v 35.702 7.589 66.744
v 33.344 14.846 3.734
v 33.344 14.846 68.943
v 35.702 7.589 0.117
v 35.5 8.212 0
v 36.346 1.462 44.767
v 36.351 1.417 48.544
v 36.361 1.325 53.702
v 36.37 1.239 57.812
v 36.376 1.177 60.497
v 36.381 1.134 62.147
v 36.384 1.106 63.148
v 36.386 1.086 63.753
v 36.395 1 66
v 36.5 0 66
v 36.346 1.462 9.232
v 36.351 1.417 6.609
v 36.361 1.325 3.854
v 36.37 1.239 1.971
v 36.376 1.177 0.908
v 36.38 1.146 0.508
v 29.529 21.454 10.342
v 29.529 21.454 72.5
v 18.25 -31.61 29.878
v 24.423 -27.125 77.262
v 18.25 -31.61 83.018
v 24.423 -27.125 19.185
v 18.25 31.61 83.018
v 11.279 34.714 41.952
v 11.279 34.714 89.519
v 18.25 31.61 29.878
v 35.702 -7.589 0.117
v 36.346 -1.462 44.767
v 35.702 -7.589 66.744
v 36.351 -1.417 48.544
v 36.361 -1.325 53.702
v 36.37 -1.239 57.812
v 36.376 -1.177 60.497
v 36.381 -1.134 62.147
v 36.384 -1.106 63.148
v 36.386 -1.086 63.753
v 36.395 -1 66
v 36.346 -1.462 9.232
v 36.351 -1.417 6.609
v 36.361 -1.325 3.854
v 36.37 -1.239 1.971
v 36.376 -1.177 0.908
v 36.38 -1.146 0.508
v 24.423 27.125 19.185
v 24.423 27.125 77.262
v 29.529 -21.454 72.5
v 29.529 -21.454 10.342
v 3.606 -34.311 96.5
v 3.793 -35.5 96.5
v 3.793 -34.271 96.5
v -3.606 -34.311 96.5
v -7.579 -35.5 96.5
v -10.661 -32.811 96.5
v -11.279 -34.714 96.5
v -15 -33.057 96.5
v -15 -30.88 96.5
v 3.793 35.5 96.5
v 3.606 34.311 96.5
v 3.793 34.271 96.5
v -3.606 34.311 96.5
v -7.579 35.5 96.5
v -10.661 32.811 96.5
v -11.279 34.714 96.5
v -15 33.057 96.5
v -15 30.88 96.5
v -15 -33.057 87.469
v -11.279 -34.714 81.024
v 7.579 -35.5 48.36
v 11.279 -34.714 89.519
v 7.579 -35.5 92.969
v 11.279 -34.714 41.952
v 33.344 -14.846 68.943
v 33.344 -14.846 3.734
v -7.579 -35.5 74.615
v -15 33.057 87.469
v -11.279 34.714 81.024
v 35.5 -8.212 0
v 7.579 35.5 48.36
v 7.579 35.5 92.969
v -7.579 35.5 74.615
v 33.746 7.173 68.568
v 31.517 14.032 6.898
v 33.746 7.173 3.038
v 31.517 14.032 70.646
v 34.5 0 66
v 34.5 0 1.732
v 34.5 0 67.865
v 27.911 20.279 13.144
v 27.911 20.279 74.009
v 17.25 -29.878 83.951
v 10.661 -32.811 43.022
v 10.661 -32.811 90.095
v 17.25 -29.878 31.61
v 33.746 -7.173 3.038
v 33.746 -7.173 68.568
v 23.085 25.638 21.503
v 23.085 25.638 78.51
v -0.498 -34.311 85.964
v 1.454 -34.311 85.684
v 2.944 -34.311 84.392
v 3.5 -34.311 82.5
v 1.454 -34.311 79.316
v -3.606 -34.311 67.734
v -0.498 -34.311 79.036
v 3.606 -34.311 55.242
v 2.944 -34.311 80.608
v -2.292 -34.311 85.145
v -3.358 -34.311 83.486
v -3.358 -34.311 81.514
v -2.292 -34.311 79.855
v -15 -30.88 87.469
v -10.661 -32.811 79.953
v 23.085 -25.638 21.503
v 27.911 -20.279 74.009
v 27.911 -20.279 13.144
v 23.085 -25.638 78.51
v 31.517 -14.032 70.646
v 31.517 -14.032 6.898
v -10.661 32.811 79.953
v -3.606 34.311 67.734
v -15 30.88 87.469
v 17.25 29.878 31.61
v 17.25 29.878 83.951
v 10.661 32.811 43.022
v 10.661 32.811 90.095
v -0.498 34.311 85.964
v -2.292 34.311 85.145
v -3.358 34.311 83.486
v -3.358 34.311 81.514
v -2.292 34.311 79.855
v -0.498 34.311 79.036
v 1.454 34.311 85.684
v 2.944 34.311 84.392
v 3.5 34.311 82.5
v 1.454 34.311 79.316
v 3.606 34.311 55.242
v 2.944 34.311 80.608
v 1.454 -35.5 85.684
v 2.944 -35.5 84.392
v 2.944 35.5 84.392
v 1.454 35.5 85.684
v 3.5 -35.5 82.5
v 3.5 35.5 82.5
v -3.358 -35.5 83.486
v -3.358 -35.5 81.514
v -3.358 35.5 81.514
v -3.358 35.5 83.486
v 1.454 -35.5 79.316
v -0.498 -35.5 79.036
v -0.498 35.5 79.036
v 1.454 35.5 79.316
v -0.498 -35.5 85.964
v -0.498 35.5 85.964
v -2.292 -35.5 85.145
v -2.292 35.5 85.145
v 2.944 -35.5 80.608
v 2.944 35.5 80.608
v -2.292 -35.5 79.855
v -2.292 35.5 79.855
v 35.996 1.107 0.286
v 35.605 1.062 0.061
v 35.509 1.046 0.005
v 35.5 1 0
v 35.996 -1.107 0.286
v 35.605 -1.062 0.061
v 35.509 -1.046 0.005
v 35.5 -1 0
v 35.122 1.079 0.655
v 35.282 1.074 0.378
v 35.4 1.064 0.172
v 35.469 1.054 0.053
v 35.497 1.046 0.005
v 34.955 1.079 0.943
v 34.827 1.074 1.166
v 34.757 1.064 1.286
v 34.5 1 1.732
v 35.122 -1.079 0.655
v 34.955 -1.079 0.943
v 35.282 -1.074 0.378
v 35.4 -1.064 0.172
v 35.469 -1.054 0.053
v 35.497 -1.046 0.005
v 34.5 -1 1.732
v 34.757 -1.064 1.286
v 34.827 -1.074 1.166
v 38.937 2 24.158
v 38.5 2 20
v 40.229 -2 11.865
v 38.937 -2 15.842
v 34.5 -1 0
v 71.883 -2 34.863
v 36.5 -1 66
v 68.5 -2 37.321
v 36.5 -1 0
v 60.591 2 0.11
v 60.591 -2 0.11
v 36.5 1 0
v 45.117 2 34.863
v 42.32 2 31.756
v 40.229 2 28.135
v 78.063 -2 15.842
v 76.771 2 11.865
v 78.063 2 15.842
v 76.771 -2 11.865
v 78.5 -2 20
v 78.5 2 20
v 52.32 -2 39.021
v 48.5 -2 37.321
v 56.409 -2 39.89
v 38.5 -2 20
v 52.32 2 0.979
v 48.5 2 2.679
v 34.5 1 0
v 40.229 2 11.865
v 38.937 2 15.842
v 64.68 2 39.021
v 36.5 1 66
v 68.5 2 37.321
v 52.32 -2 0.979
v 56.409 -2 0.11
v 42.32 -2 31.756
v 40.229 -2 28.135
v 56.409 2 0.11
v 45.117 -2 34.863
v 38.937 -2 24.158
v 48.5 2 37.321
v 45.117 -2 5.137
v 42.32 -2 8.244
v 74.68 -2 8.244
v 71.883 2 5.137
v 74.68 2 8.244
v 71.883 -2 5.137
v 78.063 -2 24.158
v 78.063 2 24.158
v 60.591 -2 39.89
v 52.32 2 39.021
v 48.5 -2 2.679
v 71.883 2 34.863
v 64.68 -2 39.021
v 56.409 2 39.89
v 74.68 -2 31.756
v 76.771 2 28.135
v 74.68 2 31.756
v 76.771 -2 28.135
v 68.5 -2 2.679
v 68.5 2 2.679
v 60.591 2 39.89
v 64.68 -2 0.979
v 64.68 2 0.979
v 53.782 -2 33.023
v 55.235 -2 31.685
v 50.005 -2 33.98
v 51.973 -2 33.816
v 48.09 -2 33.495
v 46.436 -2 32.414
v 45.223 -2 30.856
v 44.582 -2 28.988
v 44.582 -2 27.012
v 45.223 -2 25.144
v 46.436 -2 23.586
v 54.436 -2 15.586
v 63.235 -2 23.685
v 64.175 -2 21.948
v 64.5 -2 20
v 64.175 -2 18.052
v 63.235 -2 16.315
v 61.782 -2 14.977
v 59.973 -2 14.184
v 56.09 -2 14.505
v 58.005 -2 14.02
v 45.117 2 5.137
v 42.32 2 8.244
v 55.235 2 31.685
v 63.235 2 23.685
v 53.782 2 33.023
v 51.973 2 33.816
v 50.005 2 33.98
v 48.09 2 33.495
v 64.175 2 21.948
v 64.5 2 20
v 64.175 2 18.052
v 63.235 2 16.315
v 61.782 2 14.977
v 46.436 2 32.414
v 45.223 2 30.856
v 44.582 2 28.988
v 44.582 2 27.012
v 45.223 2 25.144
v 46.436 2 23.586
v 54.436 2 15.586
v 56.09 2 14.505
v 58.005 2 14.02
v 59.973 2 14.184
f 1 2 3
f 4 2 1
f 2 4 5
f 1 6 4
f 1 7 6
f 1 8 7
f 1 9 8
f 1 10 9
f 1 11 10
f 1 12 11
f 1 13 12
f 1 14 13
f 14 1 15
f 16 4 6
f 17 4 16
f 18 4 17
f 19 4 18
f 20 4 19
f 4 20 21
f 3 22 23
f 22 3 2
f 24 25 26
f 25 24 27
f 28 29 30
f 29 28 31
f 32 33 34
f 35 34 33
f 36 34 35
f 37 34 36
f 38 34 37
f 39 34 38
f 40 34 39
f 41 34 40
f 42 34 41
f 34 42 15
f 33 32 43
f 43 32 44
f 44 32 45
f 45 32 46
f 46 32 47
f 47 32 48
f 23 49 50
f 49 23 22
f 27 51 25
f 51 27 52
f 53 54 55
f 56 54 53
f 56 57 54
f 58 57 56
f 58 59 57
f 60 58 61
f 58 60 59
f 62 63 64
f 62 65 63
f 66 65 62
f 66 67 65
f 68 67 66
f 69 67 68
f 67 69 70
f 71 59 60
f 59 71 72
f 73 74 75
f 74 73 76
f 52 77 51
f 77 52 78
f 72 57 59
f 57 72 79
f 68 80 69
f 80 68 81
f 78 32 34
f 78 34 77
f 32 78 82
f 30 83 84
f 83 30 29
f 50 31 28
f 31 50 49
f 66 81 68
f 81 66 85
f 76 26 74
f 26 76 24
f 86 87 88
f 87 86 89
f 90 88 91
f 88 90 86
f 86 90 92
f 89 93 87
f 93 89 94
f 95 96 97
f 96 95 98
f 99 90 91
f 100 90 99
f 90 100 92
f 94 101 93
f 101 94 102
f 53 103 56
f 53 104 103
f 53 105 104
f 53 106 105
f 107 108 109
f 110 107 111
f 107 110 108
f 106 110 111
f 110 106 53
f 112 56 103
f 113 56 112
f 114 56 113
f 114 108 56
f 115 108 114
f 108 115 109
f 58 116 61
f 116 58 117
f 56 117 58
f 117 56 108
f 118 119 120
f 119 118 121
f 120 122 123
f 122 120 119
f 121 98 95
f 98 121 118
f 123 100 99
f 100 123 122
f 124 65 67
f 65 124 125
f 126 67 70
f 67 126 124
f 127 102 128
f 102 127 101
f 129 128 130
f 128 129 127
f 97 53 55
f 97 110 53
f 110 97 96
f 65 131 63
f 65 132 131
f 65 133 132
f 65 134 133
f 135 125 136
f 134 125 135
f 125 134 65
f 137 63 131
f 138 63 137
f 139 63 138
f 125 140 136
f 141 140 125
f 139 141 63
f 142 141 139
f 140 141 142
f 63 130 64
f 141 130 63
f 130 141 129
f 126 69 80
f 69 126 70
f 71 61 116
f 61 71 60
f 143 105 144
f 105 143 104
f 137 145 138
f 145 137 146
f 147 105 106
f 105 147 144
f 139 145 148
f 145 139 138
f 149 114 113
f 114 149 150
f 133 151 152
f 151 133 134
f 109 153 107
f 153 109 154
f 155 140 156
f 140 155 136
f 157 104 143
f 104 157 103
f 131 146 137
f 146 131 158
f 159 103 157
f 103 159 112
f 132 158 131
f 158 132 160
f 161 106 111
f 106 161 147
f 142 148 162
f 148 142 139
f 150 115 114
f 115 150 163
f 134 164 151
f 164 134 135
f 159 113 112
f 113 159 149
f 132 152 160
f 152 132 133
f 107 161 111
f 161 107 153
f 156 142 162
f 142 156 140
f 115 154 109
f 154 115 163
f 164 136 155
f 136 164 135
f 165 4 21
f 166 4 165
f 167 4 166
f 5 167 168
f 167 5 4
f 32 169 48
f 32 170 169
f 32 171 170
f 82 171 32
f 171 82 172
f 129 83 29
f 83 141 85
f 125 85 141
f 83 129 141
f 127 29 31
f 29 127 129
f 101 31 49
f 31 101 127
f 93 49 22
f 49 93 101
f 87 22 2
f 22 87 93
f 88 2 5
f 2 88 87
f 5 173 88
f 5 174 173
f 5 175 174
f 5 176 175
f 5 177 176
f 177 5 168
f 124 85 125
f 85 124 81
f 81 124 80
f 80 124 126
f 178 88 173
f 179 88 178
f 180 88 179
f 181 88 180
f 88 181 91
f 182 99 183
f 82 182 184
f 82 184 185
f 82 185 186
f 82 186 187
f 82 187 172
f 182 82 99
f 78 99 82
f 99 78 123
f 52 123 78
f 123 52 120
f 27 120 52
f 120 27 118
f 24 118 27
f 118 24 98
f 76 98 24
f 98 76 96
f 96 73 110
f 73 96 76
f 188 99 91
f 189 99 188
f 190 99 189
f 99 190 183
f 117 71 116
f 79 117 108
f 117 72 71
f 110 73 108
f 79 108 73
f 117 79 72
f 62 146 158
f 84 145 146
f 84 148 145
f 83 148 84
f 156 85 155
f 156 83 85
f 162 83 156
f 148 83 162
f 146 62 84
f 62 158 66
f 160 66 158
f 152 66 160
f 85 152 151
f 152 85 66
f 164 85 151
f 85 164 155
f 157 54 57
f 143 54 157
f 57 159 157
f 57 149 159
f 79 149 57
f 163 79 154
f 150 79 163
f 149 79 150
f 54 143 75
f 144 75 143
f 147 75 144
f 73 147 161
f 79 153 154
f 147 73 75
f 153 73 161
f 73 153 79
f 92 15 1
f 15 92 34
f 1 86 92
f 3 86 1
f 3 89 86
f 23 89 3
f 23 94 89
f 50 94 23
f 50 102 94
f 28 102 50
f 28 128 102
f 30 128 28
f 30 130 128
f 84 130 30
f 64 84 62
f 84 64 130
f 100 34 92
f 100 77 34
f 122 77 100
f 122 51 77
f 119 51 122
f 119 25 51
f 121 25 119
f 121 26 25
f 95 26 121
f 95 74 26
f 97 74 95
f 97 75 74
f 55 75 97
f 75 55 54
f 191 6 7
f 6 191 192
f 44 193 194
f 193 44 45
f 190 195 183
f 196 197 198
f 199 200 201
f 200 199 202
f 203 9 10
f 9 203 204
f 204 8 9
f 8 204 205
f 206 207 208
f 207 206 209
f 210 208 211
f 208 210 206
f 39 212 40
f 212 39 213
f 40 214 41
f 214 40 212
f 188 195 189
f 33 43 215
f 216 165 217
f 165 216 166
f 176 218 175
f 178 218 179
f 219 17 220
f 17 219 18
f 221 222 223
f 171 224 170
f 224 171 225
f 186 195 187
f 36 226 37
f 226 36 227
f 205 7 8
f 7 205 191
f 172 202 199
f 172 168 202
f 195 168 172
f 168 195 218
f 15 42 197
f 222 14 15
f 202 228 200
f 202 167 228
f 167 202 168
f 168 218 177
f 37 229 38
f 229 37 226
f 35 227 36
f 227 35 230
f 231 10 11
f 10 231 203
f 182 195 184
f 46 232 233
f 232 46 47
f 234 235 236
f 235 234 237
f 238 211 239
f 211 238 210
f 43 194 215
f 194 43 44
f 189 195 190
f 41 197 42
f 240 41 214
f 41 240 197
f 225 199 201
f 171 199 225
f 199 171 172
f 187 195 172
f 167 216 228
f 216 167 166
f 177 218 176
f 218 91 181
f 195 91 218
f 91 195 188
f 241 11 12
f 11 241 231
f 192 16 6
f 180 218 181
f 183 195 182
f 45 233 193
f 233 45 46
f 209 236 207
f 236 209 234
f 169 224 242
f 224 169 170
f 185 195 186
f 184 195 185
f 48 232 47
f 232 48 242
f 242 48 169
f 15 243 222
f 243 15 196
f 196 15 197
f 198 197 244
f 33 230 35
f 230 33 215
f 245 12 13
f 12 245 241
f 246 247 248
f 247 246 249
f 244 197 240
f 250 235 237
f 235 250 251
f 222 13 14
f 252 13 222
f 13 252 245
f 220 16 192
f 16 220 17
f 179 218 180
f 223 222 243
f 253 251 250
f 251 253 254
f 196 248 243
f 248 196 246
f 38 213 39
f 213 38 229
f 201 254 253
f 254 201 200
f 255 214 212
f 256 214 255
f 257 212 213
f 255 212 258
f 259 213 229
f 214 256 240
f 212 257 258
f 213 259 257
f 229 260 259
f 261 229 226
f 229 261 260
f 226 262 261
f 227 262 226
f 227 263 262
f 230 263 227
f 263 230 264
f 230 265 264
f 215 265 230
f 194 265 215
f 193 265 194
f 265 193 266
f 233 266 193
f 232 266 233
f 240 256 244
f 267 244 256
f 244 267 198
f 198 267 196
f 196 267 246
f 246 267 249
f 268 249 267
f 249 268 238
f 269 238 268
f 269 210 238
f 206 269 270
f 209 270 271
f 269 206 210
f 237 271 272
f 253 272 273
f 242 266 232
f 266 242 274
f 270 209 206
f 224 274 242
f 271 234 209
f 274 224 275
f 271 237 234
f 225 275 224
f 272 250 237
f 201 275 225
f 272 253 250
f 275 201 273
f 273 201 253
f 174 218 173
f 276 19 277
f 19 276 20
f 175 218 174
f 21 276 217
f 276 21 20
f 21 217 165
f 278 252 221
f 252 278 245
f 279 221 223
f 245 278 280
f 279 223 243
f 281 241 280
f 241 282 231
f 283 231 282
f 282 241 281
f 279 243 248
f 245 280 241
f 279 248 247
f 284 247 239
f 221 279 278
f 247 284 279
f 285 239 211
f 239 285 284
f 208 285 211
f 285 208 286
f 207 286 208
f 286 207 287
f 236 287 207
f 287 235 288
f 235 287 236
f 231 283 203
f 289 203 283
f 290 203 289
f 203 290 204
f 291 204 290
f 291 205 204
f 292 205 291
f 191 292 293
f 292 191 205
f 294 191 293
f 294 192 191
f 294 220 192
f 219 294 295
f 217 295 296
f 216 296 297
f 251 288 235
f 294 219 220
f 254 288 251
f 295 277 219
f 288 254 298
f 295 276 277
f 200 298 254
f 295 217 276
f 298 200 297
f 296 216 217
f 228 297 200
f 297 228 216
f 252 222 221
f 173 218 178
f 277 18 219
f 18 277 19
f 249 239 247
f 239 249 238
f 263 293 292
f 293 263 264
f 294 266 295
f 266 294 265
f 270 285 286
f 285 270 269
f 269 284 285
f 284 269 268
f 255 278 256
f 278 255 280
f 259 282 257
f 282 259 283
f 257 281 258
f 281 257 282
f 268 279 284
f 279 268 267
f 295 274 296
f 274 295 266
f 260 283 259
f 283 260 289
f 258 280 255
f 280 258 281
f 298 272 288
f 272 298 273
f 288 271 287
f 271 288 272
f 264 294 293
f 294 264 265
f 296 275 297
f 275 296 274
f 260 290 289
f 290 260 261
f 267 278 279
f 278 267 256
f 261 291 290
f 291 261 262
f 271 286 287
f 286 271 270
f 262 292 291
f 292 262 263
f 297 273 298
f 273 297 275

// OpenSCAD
VOkova();

mastDia = 69;


// Ограничение по высоте оковки "снаружи"
okH = 96.5;
thikns = 2; 
// Высота "уха"
okH1 = 66;
bigR = 20;
holeR = 6;
frontLen = 44;


module VOkova() {
        
   
    // Вырез трубы
    // скошенный кусок трубы, из которого вырезали ещё.
    difference() {
        // скошенный кусок трубы
        intersection() {
            // кусок трубы
            difference() {
                cylinder( h = okH , d = mastDia + 2*thikns );

                translate([ 0 , 0 , -1/2 ]) 
                cylinder( h = okH + 1 , d = mastDia );
    
                translate([ - mastDia/2 - 15 , 0 , okH/2 + 1 ])
                cube([ mastDia , mastDia + 2 , okH + 2 ] , center=true );
                
                // Дырки под болты
                translate([ 0 , 0, okH -14 ]) 
                rotate([90, 0, 0])
                translate([ 0 , 0, -40 ]) 
                cylinder( h = 80, d = 7 );
            }

            translate([ mastDia/2 + 1 , 0 , 0 ])
            rotate([ 0 , 60 , 0 ])
            translate([ -mastDia , 0 , okH1/2 ]) 
            cube([ mastDia * 2 , mastDia + 2 , okH1 ] , center=true );

        }

        translate([ mastDia/2 + 2 , 0 , okH1 ]) 
        rotate([ 0 , 43 , 0 ])
        translate([ -mastDia , 0 , okH1/2 ])
        cube([ mastDia * 2 , mastDia + 5 , okH1 ] , center=true );

    }

    // УХО
    difference() {
    hull() {
        translate([ mastDia/2 + frontLen - bigR , 0 , bigR ]) 
        rotate([ 90 , 0 , 0 ]) 
        cylinder( h = thikns * 2 , r = bigR , center=true );

        translate([ mastDia/2 + thikns/2 , 0 , okH1/2 ])
        cube([ thikns , thikns , okH1 ] , center=true );
    }

    hull() {

        translate([ mastDia/2 + frontLen - bigR , 0 , bigR ]) 
        rotate([ 90 , 0 , 0 ]) 
        cylinder( h = thikns * 2 + 2 , r = holeR , center=true );

        translate([ mastDia/2 + frontLen - bigR - 8 , 0 , bigR + 8 ]) 
        rotate([ 90 , 0 , 0 ]) 
        cylinder( h = thikns * 2 + 2 , r = holeR , center=true );
    }}
}
